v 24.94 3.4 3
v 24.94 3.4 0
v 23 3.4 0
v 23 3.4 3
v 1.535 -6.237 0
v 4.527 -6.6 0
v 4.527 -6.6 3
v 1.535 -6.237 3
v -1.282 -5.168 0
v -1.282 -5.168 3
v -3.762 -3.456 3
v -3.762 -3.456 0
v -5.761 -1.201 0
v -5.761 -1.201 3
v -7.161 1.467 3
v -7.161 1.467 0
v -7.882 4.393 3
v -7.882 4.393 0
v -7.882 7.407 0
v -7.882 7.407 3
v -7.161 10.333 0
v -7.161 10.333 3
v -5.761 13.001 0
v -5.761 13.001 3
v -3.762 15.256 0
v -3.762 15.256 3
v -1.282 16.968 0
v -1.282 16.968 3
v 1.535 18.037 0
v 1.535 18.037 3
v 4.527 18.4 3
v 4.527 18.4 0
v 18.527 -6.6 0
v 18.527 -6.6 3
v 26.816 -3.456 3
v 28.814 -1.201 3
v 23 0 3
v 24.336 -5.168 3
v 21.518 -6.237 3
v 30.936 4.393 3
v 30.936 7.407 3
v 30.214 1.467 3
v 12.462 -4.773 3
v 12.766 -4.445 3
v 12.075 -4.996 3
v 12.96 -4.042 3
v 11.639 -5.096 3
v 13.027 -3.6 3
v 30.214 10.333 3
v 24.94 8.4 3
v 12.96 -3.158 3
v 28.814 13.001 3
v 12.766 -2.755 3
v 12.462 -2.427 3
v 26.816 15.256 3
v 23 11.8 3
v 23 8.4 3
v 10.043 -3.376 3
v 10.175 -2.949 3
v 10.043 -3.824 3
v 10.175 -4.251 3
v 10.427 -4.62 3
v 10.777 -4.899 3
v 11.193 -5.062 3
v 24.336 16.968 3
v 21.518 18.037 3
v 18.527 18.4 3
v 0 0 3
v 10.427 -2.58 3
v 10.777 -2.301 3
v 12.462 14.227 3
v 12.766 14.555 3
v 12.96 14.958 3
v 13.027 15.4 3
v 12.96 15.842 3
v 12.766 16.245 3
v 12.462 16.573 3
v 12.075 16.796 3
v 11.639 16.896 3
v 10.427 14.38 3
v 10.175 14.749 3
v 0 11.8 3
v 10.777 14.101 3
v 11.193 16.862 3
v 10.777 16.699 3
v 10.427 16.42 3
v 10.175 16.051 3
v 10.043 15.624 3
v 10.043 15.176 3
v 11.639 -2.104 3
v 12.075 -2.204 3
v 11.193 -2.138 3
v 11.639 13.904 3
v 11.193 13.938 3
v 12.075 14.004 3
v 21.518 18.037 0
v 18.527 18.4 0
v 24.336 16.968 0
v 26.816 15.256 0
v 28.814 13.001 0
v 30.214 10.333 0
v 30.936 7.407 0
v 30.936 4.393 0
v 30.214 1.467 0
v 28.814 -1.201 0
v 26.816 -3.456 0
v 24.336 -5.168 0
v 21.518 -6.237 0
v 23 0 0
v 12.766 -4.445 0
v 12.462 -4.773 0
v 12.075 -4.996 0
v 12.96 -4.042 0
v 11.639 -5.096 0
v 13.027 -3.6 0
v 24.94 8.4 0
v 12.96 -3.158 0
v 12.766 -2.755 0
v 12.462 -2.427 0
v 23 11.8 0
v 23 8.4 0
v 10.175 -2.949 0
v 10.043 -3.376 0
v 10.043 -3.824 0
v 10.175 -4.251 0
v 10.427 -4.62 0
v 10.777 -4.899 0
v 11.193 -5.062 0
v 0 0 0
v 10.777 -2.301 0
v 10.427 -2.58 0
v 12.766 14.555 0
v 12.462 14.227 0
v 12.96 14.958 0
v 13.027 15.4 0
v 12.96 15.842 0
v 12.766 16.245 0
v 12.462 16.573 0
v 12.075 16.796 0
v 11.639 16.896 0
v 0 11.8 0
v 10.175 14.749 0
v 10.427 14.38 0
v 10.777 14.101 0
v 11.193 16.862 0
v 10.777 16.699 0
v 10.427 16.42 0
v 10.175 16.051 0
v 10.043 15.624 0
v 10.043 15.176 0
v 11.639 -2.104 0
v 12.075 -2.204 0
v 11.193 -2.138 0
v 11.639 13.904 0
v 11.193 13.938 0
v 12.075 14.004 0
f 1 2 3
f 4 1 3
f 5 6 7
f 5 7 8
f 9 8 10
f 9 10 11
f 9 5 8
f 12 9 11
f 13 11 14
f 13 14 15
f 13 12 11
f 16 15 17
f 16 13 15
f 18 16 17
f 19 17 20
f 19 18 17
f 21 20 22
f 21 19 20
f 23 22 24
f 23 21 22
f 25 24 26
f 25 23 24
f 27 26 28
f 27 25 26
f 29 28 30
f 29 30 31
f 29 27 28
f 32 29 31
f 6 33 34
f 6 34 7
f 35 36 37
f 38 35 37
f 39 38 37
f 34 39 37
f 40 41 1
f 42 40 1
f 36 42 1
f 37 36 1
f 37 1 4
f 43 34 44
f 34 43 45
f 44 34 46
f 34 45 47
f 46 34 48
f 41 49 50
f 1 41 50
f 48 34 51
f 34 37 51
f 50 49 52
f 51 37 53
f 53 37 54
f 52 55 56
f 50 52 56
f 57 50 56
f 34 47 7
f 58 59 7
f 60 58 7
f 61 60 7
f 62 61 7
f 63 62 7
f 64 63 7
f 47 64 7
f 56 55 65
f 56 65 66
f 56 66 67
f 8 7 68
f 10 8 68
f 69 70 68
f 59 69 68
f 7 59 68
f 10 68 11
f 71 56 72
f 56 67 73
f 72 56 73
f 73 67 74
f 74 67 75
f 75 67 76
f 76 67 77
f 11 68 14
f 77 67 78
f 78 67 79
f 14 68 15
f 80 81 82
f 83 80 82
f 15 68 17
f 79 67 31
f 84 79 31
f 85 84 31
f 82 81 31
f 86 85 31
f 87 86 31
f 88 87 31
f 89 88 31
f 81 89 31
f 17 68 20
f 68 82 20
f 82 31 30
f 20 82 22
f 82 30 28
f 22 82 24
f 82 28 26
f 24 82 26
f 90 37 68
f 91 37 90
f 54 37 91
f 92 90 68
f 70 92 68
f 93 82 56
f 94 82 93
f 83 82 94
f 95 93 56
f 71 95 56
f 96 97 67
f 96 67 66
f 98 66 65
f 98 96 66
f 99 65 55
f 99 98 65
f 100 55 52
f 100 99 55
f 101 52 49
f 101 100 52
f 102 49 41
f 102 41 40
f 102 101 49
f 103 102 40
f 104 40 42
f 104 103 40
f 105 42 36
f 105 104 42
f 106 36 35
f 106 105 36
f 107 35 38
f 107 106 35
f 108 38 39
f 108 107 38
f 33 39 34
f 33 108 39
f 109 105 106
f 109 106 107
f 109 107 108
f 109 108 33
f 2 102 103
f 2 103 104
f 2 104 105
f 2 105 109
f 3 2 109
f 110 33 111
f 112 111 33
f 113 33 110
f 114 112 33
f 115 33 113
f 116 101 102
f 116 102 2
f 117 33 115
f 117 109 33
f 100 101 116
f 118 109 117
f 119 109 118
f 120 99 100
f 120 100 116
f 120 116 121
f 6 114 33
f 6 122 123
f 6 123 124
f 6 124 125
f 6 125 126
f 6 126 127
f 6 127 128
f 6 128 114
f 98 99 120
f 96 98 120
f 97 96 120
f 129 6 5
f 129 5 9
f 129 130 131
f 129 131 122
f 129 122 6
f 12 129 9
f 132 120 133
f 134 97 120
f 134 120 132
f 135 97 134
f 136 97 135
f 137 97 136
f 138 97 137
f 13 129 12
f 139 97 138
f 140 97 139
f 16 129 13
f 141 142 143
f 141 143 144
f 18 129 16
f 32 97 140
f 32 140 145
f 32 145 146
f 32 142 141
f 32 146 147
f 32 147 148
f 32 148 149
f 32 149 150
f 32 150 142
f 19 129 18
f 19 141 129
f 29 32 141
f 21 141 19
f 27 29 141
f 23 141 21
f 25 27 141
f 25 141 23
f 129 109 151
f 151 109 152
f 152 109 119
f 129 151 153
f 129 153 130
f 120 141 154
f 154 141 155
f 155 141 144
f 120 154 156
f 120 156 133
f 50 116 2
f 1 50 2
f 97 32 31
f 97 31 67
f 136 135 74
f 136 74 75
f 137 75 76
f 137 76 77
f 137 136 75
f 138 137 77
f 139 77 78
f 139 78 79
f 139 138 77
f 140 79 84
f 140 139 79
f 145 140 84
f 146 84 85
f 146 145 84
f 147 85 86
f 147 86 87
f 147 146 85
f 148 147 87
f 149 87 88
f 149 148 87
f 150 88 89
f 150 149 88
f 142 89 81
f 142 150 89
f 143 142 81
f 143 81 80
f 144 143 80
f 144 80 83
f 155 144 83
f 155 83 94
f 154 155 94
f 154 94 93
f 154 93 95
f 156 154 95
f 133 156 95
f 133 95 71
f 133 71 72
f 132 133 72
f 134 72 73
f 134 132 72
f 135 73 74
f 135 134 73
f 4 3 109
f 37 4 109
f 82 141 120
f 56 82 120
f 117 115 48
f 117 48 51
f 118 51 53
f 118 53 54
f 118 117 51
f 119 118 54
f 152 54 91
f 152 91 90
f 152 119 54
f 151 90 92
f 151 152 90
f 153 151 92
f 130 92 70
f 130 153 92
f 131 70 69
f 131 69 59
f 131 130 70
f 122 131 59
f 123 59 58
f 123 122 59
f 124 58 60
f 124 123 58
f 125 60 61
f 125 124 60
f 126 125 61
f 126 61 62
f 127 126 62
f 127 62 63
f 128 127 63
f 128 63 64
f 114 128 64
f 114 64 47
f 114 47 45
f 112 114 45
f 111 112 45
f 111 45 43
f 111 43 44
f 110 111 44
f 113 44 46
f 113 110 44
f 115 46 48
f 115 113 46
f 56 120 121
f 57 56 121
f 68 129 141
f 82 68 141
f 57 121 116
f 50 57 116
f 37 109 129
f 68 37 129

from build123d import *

# Parameters (mm, degrees)
ESQUISSE2_R        = 1.5
BOSS_EXTRU_2_DEPTH = 3


with BuildPart() as part:
    # Esquisse2 → Boss.-Extru.2 (new body)
    with BuildSketch(Plane.XY):
        with BuildLine():
            Line((4.526650681, 18.4), (18.526650681, 18.4))
            ThreePointArc((18.526650681, 18.4), (31.026650681, 5.9), (18.526650681, -6.6))
            Line((18.526650681, -6.6), (4.526650681, -6.6))
            ThreePointArc((4.526650681, -6.6), (-7.973349319, 5.9), (4.526650681, 18.4))
        make_face()
        with Locations((11.526650681, 15.4)):
            Circle(ESQUISSE2_R, mode=Mode.SUBTRACT)
        with Locations((11.526650681, -3.6)):
            Circle(ESQUISSE2_R, mode=Mode.SUBTRACT)
        Polygon((0, 0), (0, 11.8), (23, 11.8), (23, 8.4), (24.940257674, 8.4), (24.940257674, 3.4), (23, 3.4), (23, 0), align=None, mode=Mode.SUBTRACT)
    extrude(amount=BOSS_EXTRU_2_DEPTH)


solid = part.part
